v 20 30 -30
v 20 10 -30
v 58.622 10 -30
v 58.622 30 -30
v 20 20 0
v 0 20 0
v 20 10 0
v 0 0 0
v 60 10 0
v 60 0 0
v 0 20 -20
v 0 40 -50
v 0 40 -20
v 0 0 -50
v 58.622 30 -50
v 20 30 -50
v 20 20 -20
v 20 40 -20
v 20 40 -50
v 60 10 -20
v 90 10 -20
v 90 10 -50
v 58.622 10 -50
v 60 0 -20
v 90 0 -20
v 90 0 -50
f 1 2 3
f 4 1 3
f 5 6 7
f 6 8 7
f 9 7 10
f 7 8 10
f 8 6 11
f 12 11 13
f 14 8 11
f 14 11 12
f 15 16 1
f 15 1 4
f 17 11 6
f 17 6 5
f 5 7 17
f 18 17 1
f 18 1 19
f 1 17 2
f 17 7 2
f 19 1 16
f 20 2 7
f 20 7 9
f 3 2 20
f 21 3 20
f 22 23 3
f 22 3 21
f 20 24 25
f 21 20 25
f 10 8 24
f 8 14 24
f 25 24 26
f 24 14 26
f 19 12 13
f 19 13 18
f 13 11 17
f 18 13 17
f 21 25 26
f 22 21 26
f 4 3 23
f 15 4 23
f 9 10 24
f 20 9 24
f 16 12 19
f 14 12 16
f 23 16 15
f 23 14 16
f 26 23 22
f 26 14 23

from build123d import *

# Parameters (mm, degrees)
BOSS_EXTRUDE2_DEPTH = 10
SKETCH2_W           = 20
SKETCH2_H           = 20
BOSS_EXTRUDE3_DEPTH = 10
SKETCH3_W           = 40
SKETCH3_H           = 20
BOSS_EXTRUDE4_DEPTH = 20
SKETCH4_W           = 20
SKETCH4_H           = 30
BOSS_EXTRUDE6_DEPTH = 30


with BuildPart() as part:
    # Sketch1 → Boss-Extrude2 (new body)
    with BuildSketch(Plane(origin=(0, 0, 0), x_dir=(1, 0, 0), z_dir=(0, 1, 0))):
        Polygon((0, 0), (60, 0), (60, 20), (90, 20), (90, 50), (60, 50), (0, 50), align=None)
    extrude(amount=BOSS_EXTRUDE2_DEPTH)

    # Sketch2 → Boss-Extrude3 (add)
    with BuildSketch(Plane(origin=(0, 10, 0), x_dir=(1, 0, 0), z_dir=(0, 1, 0))):
        with Locations((10, 10)):
            Rectangle(SKETCH2_W, SKETCH2_H)
    extrude(amount=BOSS_EXTRUDE3_DEPTH)

    # Sketch3 → Boss-Extrude4 (add)
    with BuildSketch(Plane(origin=(0, 10, 0), x_dir=(1, 0, 0), z_dir=(0, 1, 0))):
        with Locations((38.622423296, 40)):
            Rectangle(SKETCH3_W, SKETCH3_H)
    extrude(amount=BOSS_EXTRUDE4_DEPTH)

    # Sketch4 → Boss-Extrude6 (add)
    with BuildSketch(Plane(origin=(0, 10, 0), x_dir=(1, 0, 0), z_dir=(0, 1, 0))):
        with Locations((10, 35)):
            Rectangle(SKETCH4_W, SKETCH4_H)
    extrude(amount=BOSS_EXTRUDE6_DEPTH)


solid = part.part
